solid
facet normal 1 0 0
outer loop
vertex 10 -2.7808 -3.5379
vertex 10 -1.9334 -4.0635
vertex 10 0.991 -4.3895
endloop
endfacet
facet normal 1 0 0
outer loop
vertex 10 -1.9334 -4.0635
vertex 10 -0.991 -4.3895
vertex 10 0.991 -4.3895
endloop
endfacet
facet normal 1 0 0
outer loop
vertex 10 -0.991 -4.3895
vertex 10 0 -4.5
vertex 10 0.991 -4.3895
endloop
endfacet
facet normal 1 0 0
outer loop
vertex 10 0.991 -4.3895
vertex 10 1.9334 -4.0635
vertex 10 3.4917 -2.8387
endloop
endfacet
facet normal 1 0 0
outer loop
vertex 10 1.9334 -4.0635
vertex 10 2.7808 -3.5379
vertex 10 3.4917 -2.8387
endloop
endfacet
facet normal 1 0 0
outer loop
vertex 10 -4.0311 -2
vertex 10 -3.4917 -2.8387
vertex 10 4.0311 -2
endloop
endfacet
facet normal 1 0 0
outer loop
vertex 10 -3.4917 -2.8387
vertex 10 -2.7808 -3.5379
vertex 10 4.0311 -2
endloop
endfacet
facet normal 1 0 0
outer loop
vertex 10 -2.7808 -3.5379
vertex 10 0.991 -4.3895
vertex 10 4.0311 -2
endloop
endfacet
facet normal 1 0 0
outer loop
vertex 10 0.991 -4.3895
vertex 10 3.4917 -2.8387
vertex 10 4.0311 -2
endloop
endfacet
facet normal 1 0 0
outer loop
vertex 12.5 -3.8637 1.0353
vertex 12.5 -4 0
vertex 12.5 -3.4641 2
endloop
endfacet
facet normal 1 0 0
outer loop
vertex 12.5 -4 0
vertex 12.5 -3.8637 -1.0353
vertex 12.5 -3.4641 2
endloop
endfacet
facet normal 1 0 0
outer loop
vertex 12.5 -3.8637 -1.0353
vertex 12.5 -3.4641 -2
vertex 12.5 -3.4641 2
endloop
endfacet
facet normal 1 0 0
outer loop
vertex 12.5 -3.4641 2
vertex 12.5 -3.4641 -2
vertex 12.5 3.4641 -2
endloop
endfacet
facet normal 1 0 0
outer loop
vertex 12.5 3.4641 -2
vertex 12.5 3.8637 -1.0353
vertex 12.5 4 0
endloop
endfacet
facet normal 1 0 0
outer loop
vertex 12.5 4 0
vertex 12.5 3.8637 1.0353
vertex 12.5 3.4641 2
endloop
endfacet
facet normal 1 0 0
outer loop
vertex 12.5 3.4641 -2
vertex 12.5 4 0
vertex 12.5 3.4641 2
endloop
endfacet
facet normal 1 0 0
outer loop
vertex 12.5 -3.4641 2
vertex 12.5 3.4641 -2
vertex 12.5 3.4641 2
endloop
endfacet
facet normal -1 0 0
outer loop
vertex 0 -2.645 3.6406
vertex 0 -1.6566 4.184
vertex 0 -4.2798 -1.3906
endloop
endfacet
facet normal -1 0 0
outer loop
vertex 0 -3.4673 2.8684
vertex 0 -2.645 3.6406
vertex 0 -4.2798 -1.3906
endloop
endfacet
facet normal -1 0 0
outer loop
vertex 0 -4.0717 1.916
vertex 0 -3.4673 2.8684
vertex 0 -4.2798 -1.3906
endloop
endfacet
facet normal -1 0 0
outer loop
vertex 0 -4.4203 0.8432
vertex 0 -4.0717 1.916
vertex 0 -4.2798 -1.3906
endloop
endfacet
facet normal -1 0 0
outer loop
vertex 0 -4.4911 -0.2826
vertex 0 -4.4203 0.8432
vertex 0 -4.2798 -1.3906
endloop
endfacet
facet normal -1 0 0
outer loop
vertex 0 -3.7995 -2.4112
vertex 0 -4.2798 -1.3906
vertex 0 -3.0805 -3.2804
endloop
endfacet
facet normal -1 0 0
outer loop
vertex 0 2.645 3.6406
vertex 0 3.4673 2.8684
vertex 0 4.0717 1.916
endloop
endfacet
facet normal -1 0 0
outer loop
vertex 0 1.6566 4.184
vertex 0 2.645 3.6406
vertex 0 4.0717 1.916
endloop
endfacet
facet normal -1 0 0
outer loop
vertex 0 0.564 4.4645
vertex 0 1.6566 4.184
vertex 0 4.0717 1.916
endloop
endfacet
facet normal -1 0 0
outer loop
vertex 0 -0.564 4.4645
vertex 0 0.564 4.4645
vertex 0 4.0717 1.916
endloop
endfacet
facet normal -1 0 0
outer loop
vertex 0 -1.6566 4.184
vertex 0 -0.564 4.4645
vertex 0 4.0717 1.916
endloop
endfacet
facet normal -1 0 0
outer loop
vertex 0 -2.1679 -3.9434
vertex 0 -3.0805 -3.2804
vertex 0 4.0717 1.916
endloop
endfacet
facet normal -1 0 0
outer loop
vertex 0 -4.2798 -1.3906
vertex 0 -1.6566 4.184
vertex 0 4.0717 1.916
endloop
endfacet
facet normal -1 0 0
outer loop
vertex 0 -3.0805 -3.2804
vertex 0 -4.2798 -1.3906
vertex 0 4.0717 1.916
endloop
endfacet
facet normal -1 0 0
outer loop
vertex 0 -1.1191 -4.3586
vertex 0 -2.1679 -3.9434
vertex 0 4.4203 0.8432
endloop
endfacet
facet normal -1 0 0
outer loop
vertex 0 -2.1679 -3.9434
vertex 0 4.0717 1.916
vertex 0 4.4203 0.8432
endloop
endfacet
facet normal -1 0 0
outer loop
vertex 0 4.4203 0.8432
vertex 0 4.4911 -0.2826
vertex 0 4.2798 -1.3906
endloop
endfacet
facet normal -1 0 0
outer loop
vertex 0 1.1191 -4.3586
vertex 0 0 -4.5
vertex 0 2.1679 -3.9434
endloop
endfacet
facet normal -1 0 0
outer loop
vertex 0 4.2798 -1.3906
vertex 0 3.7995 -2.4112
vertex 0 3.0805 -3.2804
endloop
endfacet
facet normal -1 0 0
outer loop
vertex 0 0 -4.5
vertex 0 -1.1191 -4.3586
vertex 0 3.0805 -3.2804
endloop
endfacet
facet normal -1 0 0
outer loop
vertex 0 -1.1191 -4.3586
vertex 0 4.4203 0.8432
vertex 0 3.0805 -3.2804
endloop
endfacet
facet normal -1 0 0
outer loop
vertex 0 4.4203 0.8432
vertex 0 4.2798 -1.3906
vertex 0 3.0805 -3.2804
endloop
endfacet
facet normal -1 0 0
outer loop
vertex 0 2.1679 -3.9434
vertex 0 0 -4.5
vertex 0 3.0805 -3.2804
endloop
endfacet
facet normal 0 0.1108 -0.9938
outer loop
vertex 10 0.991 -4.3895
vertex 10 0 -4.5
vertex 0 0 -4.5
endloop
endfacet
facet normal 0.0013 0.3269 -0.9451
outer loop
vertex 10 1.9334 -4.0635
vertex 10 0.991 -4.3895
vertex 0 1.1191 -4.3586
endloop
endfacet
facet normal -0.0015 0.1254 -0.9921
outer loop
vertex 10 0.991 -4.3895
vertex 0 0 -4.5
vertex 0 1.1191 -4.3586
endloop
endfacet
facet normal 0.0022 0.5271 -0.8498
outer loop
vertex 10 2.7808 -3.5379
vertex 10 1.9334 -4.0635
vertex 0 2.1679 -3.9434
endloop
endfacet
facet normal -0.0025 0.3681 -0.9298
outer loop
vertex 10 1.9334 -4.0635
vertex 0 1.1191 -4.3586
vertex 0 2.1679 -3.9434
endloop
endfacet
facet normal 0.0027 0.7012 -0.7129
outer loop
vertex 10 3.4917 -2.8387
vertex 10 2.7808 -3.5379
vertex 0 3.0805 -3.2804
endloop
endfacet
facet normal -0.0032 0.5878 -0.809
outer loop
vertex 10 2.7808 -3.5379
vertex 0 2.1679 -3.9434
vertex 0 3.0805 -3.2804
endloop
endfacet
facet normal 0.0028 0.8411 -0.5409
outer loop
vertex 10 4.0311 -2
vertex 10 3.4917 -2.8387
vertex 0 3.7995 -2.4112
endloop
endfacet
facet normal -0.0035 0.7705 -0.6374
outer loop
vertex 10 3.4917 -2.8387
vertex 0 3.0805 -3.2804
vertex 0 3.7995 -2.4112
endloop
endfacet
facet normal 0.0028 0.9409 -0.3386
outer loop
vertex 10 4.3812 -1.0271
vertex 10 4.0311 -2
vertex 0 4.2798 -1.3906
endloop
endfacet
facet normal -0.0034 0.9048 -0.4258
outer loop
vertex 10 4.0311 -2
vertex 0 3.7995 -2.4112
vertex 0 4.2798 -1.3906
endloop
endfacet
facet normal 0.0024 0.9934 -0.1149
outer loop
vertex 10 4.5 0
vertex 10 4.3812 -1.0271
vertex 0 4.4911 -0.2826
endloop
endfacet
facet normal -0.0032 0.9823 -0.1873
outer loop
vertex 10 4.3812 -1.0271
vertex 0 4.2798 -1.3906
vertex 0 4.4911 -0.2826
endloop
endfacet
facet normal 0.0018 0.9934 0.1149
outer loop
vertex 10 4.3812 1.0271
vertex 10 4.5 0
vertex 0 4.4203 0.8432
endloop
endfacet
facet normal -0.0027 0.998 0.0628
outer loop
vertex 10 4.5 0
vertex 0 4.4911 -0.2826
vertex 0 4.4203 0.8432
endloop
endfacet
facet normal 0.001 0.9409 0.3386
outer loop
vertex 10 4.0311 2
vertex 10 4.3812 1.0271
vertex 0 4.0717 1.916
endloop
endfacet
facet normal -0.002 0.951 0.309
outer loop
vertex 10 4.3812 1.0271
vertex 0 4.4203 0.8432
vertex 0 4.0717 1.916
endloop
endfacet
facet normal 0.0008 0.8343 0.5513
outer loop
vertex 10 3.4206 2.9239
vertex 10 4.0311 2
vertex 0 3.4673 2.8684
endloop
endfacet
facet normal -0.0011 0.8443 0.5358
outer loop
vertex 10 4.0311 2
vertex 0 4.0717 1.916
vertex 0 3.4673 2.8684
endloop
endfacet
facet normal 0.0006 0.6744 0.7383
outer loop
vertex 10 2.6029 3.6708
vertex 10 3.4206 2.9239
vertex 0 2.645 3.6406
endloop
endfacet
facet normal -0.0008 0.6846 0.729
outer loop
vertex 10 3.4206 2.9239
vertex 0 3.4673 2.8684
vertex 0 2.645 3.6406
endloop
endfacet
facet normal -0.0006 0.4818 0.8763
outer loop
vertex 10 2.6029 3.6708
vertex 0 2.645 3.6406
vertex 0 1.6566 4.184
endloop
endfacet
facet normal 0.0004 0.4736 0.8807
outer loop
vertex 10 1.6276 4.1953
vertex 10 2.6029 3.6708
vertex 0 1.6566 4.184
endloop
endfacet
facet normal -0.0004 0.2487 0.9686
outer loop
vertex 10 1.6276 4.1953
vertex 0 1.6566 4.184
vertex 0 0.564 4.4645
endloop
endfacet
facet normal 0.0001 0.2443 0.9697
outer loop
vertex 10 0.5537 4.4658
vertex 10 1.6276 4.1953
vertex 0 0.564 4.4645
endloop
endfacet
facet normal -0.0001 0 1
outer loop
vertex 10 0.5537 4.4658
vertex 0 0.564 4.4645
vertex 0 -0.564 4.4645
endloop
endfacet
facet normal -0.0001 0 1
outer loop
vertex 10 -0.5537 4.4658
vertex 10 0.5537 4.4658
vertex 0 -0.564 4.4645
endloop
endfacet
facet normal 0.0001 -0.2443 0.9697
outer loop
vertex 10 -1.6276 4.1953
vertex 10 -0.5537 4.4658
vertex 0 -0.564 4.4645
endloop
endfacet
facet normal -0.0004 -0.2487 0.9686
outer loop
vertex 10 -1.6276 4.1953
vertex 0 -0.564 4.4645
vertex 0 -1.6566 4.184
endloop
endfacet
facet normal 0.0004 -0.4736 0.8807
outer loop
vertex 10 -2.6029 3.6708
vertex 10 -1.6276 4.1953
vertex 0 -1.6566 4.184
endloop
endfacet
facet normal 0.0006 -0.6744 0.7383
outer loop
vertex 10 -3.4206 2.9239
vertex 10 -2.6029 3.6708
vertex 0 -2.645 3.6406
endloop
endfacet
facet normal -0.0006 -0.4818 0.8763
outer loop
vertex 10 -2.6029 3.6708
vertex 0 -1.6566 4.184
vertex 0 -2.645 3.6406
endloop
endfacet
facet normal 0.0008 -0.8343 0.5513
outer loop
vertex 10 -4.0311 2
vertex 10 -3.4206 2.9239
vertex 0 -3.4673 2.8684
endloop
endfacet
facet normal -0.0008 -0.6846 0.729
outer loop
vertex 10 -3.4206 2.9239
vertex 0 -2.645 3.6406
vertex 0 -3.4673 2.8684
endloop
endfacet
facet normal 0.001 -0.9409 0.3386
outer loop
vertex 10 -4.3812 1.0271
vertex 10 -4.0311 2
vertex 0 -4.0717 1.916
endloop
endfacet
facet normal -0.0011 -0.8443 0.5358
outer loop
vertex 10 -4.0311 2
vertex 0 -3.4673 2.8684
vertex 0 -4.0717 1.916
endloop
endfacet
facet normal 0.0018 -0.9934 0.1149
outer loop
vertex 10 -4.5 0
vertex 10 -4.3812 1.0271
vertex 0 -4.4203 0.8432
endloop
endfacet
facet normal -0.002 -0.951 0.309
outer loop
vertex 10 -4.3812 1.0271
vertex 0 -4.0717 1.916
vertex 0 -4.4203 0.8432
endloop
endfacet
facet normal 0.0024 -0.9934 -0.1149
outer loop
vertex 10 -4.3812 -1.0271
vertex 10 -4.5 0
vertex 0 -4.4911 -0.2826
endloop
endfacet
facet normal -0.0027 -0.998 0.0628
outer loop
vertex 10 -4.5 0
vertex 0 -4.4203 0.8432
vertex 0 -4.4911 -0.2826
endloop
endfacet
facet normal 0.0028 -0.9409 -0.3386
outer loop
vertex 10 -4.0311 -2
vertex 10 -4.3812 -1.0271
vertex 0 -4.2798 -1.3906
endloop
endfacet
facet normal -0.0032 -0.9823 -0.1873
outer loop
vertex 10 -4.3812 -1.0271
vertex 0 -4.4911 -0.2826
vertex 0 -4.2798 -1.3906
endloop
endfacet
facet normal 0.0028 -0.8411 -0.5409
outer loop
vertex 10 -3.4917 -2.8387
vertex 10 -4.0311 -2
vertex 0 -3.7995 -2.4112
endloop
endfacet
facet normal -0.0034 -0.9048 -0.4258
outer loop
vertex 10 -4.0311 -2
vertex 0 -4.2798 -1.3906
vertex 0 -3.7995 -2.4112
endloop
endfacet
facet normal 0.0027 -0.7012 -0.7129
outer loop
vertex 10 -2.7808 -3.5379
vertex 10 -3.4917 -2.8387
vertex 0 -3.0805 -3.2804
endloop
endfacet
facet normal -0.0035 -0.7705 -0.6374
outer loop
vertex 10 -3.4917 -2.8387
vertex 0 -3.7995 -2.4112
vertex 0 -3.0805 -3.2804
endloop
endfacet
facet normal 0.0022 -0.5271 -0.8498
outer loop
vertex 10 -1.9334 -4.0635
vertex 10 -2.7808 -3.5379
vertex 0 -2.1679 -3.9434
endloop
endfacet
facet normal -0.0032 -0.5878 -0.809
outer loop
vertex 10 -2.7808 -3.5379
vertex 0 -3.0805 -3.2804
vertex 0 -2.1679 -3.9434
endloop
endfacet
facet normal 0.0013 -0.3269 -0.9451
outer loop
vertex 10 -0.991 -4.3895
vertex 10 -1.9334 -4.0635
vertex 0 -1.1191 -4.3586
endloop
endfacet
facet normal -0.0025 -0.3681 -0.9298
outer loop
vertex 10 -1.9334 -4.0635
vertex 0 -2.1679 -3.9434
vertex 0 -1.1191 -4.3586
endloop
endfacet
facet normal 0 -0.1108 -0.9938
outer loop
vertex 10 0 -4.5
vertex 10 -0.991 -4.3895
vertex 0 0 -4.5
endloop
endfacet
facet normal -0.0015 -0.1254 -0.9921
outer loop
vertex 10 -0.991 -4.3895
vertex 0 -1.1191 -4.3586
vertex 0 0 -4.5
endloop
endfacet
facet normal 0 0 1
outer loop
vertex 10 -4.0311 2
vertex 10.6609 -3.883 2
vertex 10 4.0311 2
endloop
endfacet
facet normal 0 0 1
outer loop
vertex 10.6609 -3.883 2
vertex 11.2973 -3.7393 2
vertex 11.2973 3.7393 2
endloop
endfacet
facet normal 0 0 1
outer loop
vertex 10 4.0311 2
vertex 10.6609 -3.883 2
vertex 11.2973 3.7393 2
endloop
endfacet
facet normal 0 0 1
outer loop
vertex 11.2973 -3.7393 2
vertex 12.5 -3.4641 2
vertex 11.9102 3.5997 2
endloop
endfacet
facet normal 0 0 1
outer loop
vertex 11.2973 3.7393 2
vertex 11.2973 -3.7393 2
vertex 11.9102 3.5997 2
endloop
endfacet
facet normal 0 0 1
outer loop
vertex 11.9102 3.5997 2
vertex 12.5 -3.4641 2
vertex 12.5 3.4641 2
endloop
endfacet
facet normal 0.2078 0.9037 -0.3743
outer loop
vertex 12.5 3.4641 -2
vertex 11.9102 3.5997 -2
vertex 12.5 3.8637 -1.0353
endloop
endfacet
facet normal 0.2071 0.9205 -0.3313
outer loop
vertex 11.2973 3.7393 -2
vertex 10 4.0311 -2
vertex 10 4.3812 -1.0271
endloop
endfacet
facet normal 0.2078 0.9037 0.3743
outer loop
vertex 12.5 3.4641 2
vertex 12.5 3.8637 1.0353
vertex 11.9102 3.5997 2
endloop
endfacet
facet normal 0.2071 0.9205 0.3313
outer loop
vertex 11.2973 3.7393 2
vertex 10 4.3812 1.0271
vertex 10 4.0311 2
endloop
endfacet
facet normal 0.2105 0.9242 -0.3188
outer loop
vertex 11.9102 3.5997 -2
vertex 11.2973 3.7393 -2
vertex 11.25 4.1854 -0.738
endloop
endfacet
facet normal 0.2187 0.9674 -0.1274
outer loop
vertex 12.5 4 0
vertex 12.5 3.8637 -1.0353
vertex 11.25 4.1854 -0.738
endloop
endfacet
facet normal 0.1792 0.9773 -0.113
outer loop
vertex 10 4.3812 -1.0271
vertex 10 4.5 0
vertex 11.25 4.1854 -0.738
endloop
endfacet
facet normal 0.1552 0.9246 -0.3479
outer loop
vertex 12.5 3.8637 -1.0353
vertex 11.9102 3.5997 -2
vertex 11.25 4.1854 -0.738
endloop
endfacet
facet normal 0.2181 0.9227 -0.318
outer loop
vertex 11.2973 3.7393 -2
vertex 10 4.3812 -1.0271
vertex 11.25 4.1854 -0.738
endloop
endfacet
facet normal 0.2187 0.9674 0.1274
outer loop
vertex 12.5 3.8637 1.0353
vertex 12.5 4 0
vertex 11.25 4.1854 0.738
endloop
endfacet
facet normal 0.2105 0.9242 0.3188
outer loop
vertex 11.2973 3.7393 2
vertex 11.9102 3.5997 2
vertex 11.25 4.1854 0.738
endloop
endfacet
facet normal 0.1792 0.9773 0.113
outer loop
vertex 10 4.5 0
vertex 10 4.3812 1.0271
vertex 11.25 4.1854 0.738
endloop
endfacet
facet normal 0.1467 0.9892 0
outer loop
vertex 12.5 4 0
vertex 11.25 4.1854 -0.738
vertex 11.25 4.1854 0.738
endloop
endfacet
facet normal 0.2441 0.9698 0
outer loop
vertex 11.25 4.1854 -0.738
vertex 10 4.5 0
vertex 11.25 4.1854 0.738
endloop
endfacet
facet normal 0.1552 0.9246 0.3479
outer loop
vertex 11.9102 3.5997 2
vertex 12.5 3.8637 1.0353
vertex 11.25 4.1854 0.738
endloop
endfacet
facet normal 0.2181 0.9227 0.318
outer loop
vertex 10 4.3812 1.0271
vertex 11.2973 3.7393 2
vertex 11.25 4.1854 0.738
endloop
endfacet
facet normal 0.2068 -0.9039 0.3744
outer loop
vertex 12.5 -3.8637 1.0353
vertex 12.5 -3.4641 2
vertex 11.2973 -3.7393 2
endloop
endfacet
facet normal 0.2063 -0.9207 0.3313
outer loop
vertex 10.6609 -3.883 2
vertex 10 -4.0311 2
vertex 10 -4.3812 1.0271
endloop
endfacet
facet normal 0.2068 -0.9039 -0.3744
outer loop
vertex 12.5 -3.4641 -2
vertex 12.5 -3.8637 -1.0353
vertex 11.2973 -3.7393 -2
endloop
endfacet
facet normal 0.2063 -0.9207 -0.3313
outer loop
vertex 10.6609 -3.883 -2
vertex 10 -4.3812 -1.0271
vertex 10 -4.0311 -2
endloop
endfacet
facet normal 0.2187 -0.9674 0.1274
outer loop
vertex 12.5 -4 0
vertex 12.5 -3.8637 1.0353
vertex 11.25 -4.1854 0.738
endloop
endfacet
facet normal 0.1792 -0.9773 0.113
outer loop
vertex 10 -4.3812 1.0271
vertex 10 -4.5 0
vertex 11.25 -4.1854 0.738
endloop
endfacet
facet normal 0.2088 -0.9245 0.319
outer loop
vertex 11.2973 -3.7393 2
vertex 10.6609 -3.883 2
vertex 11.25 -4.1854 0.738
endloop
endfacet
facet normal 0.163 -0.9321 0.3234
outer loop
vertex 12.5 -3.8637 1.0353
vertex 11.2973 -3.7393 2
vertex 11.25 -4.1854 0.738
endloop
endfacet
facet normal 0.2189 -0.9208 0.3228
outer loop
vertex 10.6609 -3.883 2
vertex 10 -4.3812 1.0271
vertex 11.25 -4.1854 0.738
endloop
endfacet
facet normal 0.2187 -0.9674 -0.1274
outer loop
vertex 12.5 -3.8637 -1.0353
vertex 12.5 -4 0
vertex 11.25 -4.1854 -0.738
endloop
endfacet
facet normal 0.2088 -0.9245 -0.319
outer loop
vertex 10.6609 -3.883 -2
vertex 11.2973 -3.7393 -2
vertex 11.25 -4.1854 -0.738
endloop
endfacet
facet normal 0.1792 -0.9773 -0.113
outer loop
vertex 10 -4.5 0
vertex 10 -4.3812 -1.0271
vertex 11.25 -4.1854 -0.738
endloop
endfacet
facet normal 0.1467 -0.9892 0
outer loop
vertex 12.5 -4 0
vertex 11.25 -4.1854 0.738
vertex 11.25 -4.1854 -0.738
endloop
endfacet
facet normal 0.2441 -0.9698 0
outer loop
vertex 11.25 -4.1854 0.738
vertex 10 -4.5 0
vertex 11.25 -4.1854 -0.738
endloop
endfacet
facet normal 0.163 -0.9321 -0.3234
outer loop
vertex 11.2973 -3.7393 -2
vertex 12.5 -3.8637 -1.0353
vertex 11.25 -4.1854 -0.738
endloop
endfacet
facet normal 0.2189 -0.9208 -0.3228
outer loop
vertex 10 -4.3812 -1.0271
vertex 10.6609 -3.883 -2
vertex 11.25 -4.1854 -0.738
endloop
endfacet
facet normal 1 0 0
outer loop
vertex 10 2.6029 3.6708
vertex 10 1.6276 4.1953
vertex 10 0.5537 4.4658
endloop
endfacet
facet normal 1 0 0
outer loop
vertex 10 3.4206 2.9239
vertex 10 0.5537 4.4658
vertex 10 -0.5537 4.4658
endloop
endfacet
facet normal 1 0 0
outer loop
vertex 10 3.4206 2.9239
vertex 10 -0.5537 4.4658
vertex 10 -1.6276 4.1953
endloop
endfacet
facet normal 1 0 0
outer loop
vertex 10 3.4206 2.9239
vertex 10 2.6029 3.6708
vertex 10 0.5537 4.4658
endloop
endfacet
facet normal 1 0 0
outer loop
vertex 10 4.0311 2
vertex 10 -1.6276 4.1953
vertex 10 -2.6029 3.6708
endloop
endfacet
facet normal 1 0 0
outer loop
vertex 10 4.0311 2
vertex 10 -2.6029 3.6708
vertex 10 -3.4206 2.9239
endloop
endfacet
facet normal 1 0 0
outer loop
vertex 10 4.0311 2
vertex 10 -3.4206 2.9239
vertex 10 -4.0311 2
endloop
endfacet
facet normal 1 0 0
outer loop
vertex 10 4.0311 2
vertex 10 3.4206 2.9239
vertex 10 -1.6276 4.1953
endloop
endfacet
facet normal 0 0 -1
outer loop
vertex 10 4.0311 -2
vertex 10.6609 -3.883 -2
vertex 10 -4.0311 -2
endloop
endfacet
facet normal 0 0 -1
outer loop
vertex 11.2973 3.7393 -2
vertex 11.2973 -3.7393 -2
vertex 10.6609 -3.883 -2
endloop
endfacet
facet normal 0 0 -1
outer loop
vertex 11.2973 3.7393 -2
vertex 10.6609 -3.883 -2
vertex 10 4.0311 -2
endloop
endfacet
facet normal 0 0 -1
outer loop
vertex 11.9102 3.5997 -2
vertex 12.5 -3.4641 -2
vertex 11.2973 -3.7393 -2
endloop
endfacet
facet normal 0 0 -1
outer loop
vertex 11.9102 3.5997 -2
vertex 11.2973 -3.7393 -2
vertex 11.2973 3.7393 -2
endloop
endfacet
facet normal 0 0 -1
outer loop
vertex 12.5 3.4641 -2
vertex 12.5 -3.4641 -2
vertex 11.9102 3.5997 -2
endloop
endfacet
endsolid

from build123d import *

# Parameters (mm, degrees)
CUT_EXTRUDE1_DEPTH = 2.5


with BuildPart() as part:
    # Sketch1 → Revolve1 (revolve)
    with BuildSketch(Plane(origin=(0, 0, 0), x_dir=(1, 0, 0), z_dir=(0, 1, 0))):
        Polygon((0, 0), (12.5, 0), (12.5, 4), (10, 4.5), (0, 4.5), align=None)
    revolve(axis=Axis((0, 0, 0), (1, 0, 0)))

    # Sketch2 → Cut-Extrude1 (cut)
    with BuildSketch(Plane(origin=(12.5, 0, 0), x_dir=(0, 0, -1), z_dir=(1, 0, 0))):
        with BuildLine():
            Line((-2, -4.031128874), (-2, 4.031128874))
            ThreePointArc((-2, 4.031128874), (-4.5, 0), (-2, -4.031128874))
        make_face()
        with BuildLine():
            Line((2, -4.031128874), (2, 4.031128874))
            ThreePointArc((2, 4.031128874), (4.5, 0), (2, -4.031128874))
        make_face()
    extrude(amount=-CUT_EXTRUDE1_DEPTH, mode=Mode.SUBTRACT)


solid = part.part
